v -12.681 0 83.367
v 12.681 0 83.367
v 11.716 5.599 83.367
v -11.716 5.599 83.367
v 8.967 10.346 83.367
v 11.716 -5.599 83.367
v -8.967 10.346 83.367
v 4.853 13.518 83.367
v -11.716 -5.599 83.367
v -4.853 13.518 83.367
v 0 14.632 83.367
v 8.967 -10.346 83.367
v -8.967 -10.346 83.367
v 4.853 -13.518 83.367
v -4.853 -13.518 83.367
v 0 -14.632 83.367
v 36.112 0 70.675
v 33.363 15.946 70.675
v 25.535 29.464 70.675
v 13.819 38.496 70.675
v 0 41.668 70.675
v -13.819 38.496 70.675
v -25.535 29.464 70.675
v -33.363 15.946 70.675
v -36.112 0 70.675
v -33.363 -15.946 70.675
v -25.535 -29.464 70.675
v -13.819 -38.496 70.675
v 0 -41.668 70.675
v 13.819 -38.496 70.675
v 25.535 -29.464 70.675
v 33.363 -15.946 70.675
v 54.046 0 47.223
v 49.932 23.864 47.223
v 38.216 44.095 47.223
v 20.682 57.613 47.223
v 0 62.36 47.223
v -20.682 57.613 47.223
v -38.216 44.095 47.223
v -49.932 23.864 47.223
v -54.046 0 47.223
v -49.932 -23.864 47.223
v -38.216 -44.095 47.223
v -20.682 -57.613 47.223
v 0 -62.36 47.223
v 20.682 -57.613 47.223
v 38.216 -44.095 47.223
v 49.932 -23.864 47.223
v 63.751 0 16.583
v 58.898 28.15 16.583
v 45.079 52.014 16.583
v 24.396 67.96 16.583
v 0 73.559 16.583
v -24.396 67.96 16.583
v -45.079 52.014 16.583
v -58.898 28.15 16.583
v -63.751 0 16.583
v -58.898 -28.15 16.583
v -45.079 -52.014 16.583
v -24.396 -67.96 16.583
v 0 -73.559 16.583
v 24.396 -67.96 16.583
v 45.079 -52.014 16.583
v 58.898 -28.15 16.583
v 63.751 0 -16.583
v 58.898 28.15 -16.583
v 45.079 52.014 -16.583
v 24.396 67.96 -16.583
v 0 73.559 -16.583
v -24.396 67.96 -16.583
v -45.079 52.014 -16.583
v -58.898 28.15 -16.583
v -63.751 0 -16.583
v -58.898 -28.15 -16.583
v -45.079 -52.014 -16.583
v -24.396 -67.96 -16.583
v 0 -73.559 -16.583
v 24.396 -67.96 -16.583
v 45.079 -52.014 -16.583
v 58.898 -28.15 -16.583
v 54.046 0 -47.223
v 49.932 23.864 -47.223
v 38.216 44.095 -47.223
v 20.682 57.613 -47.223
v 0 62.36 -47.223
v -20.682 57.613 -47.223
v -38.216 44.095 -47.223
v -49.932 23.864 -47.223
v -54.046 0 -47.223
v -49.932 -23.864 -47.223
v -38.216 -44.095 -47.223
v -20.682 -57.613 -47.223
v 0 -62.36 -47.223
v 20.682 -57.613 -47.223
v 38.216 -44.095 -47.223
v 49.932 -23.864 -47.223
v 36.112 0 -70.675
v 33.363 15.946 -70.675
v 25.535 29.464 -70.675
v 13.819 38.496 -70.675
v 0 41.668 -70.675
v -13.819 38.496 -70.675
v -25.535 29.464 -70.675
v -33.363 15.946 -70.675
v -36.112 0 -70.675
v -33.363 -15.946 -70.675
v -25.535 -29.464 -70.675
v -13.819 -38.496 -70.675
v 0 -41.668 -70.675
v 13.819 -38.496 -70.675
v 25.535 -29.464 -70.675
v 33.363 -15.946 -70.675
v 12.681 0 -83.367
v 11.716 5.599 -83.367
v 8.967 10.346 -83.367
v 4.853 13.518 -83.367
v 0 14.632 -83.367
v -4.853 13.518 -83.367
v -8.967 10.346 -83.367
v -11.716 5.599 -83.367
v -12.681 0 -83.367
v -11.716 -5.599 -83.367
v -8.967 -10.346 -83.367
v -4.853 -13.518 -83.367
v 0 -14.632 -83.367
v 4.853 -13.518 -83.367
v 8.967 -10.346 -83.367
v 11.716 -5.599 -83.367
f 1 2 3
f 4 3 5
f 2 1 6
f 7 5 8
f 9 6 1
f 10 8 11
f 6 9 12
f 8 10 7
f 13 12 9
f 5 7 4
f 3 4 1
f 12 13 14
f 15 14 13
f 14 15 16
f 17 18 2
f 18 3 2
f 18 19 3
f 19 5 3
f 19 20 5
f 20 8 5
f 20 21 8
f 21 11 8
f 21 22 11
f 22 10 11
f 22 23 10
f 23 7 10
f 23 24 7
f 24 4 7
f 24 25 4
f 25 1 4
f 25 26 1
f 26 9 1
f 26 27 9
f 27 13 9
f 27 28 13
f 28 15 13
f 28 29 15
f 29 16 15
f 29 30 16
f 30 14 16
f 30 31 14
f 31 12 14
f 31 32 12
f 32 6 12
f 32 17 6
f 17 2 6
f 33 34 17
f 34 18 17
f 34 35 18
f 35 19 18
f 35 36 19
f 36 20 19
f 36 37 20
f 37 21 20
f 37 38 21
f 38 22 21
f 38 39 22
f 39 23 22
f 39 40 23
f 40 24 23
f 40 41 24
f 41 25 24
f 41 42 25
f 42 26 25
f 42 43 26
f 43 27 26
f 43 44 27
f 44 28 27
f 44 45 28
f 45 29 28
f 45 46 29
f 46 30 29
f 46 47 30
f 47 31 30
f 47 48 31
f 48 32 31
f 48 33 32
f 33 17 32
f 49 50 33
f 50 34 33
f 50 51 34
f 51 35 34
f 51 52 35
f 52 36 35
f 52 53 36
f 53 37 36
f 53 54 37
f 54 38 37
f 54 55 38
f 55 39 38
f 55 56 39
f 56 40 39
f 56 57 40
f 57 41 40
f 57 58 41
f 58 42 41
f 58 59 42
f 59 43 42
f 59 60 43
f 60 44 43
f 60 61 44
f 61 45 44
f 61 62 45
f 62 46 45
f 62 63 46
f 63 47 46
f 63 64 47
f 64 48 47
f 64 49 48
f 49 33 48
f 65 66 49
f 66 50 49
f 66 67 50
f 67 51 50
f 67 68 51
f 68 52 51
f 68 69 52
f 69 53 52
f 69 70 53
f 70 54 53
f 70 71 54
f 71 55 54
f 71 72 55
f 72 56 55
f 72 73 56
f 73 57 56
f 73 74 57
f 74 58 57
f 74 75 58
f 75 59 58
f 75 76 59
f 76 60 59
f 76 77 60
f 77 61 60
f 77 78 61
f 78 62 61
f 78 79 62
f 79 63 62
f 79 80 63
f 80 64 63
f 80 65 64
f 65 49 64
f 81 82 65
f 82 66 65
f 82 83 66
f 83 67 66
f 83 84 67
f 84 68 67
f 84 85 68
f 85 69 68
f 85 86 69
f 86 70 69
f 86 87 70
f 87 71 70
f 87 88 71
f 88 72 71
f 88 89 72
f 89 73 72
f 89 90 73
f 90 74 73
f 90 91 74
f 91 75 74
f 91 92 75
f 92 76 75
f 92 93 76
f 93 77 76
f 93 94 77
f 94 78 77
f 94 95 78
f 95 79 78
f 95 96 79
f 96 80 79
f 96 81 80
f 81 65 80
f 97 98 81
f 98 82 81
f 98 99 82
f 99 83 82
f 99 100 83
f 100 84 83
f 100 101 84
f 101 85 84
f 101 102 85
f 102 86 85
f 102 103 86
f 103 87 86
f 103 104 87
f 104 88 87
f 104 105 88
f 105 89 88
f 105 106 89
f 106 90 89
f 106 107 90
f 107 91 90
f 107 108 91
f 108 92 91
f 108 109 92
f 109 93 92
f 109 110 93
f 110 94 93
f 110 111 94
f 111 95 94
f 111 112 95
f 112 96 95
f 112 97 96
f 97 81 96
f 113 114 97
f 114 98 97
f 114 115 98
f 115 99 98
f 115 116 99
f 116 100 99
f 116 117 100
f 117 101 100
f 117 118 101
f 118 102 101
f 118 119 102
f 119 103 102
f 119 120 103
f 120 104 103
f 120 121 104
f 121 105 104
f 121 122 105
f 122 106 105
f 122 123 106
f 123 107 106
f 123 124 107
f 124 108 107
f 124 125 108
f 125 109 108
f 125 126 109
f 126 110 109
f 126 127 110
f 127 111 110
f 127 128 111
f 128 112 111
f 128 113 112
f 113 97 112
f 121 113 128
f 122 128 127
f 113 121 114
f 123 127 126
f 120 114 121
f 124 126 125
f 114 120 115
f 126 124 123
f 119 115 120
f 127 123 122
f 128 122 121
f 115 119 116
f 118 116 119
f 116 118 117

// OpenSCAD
// Generated by SolidPython 1.0.1 on 2020-07-29 00:46:51


scale(v = [13, 15, 17]) {
	sphere(r = 5);
}
/***********************************************
*********      SolidPython code:      **********
************************************************
 
# import packages: SolidPython
from solid import *
from solid.utils import *
from itertools import chain, combinations, permutations


class Resize:

    def __init__(self, scad_file):
        self.scad_file = scad_file
        #self.scad_file = import_scad(scad_file)
        # cone/cylinder param:
        self.r1 = 0
        self.r2 = 0
        self.h = 0
        # rectangular prism param:
        self.w = 0
        self.l = 0
        # ellipse param:
        self.r = 0

    # import OpenScad code (file name corresponds to shape)


    # classify shape + parameters
    def assign(self, param1, param2, param3):
        if self.scad_file == 'cone.scad':
            self.r1 = param1
            self.r2 = param2
            self.h = param3
        elif self.scad_file == 'cylinder.scad':
            self.r1 = param1
            self.r2 = param2
            self.h = param3
        elif self.scad_file == 'rectangularPrism.scad':
            self.h = param1
            self.l = param2
            self.w = param3
        else:
            self.r = param1
            self.h = param2

    # resize parameters
    def iterate(self):
        x = range(3, 20, 2)
        i = 1
        if self.scad_file == 'cone.scad':
            tempList = list(permutations(x, 2))
            for temp in tempList:
                param1 = temp[0]
                param2 = temp[1]
                filepath = 'produced_scad_files/' + 'cone' + str(param1) + '_' + str(param2) + '_' + '.scad'
                scad_render_to_file(cylinder(h=param1, r1=param2, r2=0), filepath)

        elif self.scad_file == 'cylinder.scad':
            tempList = list(permutations(x, 3))
            for temp in tempList:
                param1 = temp[0]
                param2 = temp[1]
                filepath = 'produced_scad_files/' + 'cylinder' + str(param1) + '_' + str(param2) + '_' + '.scad'
                scad_render_to_file(cylinder(h=param1, r1=param2, r2=param2), filepath)

        elif self.scad_file == 'rectangularPrism.scad':
            tempList = list(permutations(x, 3))
            for temp in tempList:
                param1 = temp[0]
                param2 = temp[1]
                param3 = temp[2]
                filepath = 'produced_scad_files/' + 'rectangularPrism' + str(param1) + '_' + str(param2) + '_' + str(
                    param3) + '.scad'
                scad_render_to_file(cube(size=(param1, param2, param3)), filepath)

        elif self.scad_file == 'ellipse.scad':
            tempList = list(permutations(x, 4))
            for temp in tempList:
                param1 = temp[0]
                param2 = temp[1]
                param3 = temp[2]
                param4 = temp[3]
                filepath = 'produced_scad_files/' + 'ellipse' + str(param1) + '_' + str(param2) + '_' + str(param3) + '_' + str(param4) + '.scad'
                scad_render_to_file(scale([param1, param2, param3])(sphere(r=param4)), filepath)

    def render_to_scadfile(self):
        scad_render_to_file(scad, 'example.scad') 
 
************************************************/
